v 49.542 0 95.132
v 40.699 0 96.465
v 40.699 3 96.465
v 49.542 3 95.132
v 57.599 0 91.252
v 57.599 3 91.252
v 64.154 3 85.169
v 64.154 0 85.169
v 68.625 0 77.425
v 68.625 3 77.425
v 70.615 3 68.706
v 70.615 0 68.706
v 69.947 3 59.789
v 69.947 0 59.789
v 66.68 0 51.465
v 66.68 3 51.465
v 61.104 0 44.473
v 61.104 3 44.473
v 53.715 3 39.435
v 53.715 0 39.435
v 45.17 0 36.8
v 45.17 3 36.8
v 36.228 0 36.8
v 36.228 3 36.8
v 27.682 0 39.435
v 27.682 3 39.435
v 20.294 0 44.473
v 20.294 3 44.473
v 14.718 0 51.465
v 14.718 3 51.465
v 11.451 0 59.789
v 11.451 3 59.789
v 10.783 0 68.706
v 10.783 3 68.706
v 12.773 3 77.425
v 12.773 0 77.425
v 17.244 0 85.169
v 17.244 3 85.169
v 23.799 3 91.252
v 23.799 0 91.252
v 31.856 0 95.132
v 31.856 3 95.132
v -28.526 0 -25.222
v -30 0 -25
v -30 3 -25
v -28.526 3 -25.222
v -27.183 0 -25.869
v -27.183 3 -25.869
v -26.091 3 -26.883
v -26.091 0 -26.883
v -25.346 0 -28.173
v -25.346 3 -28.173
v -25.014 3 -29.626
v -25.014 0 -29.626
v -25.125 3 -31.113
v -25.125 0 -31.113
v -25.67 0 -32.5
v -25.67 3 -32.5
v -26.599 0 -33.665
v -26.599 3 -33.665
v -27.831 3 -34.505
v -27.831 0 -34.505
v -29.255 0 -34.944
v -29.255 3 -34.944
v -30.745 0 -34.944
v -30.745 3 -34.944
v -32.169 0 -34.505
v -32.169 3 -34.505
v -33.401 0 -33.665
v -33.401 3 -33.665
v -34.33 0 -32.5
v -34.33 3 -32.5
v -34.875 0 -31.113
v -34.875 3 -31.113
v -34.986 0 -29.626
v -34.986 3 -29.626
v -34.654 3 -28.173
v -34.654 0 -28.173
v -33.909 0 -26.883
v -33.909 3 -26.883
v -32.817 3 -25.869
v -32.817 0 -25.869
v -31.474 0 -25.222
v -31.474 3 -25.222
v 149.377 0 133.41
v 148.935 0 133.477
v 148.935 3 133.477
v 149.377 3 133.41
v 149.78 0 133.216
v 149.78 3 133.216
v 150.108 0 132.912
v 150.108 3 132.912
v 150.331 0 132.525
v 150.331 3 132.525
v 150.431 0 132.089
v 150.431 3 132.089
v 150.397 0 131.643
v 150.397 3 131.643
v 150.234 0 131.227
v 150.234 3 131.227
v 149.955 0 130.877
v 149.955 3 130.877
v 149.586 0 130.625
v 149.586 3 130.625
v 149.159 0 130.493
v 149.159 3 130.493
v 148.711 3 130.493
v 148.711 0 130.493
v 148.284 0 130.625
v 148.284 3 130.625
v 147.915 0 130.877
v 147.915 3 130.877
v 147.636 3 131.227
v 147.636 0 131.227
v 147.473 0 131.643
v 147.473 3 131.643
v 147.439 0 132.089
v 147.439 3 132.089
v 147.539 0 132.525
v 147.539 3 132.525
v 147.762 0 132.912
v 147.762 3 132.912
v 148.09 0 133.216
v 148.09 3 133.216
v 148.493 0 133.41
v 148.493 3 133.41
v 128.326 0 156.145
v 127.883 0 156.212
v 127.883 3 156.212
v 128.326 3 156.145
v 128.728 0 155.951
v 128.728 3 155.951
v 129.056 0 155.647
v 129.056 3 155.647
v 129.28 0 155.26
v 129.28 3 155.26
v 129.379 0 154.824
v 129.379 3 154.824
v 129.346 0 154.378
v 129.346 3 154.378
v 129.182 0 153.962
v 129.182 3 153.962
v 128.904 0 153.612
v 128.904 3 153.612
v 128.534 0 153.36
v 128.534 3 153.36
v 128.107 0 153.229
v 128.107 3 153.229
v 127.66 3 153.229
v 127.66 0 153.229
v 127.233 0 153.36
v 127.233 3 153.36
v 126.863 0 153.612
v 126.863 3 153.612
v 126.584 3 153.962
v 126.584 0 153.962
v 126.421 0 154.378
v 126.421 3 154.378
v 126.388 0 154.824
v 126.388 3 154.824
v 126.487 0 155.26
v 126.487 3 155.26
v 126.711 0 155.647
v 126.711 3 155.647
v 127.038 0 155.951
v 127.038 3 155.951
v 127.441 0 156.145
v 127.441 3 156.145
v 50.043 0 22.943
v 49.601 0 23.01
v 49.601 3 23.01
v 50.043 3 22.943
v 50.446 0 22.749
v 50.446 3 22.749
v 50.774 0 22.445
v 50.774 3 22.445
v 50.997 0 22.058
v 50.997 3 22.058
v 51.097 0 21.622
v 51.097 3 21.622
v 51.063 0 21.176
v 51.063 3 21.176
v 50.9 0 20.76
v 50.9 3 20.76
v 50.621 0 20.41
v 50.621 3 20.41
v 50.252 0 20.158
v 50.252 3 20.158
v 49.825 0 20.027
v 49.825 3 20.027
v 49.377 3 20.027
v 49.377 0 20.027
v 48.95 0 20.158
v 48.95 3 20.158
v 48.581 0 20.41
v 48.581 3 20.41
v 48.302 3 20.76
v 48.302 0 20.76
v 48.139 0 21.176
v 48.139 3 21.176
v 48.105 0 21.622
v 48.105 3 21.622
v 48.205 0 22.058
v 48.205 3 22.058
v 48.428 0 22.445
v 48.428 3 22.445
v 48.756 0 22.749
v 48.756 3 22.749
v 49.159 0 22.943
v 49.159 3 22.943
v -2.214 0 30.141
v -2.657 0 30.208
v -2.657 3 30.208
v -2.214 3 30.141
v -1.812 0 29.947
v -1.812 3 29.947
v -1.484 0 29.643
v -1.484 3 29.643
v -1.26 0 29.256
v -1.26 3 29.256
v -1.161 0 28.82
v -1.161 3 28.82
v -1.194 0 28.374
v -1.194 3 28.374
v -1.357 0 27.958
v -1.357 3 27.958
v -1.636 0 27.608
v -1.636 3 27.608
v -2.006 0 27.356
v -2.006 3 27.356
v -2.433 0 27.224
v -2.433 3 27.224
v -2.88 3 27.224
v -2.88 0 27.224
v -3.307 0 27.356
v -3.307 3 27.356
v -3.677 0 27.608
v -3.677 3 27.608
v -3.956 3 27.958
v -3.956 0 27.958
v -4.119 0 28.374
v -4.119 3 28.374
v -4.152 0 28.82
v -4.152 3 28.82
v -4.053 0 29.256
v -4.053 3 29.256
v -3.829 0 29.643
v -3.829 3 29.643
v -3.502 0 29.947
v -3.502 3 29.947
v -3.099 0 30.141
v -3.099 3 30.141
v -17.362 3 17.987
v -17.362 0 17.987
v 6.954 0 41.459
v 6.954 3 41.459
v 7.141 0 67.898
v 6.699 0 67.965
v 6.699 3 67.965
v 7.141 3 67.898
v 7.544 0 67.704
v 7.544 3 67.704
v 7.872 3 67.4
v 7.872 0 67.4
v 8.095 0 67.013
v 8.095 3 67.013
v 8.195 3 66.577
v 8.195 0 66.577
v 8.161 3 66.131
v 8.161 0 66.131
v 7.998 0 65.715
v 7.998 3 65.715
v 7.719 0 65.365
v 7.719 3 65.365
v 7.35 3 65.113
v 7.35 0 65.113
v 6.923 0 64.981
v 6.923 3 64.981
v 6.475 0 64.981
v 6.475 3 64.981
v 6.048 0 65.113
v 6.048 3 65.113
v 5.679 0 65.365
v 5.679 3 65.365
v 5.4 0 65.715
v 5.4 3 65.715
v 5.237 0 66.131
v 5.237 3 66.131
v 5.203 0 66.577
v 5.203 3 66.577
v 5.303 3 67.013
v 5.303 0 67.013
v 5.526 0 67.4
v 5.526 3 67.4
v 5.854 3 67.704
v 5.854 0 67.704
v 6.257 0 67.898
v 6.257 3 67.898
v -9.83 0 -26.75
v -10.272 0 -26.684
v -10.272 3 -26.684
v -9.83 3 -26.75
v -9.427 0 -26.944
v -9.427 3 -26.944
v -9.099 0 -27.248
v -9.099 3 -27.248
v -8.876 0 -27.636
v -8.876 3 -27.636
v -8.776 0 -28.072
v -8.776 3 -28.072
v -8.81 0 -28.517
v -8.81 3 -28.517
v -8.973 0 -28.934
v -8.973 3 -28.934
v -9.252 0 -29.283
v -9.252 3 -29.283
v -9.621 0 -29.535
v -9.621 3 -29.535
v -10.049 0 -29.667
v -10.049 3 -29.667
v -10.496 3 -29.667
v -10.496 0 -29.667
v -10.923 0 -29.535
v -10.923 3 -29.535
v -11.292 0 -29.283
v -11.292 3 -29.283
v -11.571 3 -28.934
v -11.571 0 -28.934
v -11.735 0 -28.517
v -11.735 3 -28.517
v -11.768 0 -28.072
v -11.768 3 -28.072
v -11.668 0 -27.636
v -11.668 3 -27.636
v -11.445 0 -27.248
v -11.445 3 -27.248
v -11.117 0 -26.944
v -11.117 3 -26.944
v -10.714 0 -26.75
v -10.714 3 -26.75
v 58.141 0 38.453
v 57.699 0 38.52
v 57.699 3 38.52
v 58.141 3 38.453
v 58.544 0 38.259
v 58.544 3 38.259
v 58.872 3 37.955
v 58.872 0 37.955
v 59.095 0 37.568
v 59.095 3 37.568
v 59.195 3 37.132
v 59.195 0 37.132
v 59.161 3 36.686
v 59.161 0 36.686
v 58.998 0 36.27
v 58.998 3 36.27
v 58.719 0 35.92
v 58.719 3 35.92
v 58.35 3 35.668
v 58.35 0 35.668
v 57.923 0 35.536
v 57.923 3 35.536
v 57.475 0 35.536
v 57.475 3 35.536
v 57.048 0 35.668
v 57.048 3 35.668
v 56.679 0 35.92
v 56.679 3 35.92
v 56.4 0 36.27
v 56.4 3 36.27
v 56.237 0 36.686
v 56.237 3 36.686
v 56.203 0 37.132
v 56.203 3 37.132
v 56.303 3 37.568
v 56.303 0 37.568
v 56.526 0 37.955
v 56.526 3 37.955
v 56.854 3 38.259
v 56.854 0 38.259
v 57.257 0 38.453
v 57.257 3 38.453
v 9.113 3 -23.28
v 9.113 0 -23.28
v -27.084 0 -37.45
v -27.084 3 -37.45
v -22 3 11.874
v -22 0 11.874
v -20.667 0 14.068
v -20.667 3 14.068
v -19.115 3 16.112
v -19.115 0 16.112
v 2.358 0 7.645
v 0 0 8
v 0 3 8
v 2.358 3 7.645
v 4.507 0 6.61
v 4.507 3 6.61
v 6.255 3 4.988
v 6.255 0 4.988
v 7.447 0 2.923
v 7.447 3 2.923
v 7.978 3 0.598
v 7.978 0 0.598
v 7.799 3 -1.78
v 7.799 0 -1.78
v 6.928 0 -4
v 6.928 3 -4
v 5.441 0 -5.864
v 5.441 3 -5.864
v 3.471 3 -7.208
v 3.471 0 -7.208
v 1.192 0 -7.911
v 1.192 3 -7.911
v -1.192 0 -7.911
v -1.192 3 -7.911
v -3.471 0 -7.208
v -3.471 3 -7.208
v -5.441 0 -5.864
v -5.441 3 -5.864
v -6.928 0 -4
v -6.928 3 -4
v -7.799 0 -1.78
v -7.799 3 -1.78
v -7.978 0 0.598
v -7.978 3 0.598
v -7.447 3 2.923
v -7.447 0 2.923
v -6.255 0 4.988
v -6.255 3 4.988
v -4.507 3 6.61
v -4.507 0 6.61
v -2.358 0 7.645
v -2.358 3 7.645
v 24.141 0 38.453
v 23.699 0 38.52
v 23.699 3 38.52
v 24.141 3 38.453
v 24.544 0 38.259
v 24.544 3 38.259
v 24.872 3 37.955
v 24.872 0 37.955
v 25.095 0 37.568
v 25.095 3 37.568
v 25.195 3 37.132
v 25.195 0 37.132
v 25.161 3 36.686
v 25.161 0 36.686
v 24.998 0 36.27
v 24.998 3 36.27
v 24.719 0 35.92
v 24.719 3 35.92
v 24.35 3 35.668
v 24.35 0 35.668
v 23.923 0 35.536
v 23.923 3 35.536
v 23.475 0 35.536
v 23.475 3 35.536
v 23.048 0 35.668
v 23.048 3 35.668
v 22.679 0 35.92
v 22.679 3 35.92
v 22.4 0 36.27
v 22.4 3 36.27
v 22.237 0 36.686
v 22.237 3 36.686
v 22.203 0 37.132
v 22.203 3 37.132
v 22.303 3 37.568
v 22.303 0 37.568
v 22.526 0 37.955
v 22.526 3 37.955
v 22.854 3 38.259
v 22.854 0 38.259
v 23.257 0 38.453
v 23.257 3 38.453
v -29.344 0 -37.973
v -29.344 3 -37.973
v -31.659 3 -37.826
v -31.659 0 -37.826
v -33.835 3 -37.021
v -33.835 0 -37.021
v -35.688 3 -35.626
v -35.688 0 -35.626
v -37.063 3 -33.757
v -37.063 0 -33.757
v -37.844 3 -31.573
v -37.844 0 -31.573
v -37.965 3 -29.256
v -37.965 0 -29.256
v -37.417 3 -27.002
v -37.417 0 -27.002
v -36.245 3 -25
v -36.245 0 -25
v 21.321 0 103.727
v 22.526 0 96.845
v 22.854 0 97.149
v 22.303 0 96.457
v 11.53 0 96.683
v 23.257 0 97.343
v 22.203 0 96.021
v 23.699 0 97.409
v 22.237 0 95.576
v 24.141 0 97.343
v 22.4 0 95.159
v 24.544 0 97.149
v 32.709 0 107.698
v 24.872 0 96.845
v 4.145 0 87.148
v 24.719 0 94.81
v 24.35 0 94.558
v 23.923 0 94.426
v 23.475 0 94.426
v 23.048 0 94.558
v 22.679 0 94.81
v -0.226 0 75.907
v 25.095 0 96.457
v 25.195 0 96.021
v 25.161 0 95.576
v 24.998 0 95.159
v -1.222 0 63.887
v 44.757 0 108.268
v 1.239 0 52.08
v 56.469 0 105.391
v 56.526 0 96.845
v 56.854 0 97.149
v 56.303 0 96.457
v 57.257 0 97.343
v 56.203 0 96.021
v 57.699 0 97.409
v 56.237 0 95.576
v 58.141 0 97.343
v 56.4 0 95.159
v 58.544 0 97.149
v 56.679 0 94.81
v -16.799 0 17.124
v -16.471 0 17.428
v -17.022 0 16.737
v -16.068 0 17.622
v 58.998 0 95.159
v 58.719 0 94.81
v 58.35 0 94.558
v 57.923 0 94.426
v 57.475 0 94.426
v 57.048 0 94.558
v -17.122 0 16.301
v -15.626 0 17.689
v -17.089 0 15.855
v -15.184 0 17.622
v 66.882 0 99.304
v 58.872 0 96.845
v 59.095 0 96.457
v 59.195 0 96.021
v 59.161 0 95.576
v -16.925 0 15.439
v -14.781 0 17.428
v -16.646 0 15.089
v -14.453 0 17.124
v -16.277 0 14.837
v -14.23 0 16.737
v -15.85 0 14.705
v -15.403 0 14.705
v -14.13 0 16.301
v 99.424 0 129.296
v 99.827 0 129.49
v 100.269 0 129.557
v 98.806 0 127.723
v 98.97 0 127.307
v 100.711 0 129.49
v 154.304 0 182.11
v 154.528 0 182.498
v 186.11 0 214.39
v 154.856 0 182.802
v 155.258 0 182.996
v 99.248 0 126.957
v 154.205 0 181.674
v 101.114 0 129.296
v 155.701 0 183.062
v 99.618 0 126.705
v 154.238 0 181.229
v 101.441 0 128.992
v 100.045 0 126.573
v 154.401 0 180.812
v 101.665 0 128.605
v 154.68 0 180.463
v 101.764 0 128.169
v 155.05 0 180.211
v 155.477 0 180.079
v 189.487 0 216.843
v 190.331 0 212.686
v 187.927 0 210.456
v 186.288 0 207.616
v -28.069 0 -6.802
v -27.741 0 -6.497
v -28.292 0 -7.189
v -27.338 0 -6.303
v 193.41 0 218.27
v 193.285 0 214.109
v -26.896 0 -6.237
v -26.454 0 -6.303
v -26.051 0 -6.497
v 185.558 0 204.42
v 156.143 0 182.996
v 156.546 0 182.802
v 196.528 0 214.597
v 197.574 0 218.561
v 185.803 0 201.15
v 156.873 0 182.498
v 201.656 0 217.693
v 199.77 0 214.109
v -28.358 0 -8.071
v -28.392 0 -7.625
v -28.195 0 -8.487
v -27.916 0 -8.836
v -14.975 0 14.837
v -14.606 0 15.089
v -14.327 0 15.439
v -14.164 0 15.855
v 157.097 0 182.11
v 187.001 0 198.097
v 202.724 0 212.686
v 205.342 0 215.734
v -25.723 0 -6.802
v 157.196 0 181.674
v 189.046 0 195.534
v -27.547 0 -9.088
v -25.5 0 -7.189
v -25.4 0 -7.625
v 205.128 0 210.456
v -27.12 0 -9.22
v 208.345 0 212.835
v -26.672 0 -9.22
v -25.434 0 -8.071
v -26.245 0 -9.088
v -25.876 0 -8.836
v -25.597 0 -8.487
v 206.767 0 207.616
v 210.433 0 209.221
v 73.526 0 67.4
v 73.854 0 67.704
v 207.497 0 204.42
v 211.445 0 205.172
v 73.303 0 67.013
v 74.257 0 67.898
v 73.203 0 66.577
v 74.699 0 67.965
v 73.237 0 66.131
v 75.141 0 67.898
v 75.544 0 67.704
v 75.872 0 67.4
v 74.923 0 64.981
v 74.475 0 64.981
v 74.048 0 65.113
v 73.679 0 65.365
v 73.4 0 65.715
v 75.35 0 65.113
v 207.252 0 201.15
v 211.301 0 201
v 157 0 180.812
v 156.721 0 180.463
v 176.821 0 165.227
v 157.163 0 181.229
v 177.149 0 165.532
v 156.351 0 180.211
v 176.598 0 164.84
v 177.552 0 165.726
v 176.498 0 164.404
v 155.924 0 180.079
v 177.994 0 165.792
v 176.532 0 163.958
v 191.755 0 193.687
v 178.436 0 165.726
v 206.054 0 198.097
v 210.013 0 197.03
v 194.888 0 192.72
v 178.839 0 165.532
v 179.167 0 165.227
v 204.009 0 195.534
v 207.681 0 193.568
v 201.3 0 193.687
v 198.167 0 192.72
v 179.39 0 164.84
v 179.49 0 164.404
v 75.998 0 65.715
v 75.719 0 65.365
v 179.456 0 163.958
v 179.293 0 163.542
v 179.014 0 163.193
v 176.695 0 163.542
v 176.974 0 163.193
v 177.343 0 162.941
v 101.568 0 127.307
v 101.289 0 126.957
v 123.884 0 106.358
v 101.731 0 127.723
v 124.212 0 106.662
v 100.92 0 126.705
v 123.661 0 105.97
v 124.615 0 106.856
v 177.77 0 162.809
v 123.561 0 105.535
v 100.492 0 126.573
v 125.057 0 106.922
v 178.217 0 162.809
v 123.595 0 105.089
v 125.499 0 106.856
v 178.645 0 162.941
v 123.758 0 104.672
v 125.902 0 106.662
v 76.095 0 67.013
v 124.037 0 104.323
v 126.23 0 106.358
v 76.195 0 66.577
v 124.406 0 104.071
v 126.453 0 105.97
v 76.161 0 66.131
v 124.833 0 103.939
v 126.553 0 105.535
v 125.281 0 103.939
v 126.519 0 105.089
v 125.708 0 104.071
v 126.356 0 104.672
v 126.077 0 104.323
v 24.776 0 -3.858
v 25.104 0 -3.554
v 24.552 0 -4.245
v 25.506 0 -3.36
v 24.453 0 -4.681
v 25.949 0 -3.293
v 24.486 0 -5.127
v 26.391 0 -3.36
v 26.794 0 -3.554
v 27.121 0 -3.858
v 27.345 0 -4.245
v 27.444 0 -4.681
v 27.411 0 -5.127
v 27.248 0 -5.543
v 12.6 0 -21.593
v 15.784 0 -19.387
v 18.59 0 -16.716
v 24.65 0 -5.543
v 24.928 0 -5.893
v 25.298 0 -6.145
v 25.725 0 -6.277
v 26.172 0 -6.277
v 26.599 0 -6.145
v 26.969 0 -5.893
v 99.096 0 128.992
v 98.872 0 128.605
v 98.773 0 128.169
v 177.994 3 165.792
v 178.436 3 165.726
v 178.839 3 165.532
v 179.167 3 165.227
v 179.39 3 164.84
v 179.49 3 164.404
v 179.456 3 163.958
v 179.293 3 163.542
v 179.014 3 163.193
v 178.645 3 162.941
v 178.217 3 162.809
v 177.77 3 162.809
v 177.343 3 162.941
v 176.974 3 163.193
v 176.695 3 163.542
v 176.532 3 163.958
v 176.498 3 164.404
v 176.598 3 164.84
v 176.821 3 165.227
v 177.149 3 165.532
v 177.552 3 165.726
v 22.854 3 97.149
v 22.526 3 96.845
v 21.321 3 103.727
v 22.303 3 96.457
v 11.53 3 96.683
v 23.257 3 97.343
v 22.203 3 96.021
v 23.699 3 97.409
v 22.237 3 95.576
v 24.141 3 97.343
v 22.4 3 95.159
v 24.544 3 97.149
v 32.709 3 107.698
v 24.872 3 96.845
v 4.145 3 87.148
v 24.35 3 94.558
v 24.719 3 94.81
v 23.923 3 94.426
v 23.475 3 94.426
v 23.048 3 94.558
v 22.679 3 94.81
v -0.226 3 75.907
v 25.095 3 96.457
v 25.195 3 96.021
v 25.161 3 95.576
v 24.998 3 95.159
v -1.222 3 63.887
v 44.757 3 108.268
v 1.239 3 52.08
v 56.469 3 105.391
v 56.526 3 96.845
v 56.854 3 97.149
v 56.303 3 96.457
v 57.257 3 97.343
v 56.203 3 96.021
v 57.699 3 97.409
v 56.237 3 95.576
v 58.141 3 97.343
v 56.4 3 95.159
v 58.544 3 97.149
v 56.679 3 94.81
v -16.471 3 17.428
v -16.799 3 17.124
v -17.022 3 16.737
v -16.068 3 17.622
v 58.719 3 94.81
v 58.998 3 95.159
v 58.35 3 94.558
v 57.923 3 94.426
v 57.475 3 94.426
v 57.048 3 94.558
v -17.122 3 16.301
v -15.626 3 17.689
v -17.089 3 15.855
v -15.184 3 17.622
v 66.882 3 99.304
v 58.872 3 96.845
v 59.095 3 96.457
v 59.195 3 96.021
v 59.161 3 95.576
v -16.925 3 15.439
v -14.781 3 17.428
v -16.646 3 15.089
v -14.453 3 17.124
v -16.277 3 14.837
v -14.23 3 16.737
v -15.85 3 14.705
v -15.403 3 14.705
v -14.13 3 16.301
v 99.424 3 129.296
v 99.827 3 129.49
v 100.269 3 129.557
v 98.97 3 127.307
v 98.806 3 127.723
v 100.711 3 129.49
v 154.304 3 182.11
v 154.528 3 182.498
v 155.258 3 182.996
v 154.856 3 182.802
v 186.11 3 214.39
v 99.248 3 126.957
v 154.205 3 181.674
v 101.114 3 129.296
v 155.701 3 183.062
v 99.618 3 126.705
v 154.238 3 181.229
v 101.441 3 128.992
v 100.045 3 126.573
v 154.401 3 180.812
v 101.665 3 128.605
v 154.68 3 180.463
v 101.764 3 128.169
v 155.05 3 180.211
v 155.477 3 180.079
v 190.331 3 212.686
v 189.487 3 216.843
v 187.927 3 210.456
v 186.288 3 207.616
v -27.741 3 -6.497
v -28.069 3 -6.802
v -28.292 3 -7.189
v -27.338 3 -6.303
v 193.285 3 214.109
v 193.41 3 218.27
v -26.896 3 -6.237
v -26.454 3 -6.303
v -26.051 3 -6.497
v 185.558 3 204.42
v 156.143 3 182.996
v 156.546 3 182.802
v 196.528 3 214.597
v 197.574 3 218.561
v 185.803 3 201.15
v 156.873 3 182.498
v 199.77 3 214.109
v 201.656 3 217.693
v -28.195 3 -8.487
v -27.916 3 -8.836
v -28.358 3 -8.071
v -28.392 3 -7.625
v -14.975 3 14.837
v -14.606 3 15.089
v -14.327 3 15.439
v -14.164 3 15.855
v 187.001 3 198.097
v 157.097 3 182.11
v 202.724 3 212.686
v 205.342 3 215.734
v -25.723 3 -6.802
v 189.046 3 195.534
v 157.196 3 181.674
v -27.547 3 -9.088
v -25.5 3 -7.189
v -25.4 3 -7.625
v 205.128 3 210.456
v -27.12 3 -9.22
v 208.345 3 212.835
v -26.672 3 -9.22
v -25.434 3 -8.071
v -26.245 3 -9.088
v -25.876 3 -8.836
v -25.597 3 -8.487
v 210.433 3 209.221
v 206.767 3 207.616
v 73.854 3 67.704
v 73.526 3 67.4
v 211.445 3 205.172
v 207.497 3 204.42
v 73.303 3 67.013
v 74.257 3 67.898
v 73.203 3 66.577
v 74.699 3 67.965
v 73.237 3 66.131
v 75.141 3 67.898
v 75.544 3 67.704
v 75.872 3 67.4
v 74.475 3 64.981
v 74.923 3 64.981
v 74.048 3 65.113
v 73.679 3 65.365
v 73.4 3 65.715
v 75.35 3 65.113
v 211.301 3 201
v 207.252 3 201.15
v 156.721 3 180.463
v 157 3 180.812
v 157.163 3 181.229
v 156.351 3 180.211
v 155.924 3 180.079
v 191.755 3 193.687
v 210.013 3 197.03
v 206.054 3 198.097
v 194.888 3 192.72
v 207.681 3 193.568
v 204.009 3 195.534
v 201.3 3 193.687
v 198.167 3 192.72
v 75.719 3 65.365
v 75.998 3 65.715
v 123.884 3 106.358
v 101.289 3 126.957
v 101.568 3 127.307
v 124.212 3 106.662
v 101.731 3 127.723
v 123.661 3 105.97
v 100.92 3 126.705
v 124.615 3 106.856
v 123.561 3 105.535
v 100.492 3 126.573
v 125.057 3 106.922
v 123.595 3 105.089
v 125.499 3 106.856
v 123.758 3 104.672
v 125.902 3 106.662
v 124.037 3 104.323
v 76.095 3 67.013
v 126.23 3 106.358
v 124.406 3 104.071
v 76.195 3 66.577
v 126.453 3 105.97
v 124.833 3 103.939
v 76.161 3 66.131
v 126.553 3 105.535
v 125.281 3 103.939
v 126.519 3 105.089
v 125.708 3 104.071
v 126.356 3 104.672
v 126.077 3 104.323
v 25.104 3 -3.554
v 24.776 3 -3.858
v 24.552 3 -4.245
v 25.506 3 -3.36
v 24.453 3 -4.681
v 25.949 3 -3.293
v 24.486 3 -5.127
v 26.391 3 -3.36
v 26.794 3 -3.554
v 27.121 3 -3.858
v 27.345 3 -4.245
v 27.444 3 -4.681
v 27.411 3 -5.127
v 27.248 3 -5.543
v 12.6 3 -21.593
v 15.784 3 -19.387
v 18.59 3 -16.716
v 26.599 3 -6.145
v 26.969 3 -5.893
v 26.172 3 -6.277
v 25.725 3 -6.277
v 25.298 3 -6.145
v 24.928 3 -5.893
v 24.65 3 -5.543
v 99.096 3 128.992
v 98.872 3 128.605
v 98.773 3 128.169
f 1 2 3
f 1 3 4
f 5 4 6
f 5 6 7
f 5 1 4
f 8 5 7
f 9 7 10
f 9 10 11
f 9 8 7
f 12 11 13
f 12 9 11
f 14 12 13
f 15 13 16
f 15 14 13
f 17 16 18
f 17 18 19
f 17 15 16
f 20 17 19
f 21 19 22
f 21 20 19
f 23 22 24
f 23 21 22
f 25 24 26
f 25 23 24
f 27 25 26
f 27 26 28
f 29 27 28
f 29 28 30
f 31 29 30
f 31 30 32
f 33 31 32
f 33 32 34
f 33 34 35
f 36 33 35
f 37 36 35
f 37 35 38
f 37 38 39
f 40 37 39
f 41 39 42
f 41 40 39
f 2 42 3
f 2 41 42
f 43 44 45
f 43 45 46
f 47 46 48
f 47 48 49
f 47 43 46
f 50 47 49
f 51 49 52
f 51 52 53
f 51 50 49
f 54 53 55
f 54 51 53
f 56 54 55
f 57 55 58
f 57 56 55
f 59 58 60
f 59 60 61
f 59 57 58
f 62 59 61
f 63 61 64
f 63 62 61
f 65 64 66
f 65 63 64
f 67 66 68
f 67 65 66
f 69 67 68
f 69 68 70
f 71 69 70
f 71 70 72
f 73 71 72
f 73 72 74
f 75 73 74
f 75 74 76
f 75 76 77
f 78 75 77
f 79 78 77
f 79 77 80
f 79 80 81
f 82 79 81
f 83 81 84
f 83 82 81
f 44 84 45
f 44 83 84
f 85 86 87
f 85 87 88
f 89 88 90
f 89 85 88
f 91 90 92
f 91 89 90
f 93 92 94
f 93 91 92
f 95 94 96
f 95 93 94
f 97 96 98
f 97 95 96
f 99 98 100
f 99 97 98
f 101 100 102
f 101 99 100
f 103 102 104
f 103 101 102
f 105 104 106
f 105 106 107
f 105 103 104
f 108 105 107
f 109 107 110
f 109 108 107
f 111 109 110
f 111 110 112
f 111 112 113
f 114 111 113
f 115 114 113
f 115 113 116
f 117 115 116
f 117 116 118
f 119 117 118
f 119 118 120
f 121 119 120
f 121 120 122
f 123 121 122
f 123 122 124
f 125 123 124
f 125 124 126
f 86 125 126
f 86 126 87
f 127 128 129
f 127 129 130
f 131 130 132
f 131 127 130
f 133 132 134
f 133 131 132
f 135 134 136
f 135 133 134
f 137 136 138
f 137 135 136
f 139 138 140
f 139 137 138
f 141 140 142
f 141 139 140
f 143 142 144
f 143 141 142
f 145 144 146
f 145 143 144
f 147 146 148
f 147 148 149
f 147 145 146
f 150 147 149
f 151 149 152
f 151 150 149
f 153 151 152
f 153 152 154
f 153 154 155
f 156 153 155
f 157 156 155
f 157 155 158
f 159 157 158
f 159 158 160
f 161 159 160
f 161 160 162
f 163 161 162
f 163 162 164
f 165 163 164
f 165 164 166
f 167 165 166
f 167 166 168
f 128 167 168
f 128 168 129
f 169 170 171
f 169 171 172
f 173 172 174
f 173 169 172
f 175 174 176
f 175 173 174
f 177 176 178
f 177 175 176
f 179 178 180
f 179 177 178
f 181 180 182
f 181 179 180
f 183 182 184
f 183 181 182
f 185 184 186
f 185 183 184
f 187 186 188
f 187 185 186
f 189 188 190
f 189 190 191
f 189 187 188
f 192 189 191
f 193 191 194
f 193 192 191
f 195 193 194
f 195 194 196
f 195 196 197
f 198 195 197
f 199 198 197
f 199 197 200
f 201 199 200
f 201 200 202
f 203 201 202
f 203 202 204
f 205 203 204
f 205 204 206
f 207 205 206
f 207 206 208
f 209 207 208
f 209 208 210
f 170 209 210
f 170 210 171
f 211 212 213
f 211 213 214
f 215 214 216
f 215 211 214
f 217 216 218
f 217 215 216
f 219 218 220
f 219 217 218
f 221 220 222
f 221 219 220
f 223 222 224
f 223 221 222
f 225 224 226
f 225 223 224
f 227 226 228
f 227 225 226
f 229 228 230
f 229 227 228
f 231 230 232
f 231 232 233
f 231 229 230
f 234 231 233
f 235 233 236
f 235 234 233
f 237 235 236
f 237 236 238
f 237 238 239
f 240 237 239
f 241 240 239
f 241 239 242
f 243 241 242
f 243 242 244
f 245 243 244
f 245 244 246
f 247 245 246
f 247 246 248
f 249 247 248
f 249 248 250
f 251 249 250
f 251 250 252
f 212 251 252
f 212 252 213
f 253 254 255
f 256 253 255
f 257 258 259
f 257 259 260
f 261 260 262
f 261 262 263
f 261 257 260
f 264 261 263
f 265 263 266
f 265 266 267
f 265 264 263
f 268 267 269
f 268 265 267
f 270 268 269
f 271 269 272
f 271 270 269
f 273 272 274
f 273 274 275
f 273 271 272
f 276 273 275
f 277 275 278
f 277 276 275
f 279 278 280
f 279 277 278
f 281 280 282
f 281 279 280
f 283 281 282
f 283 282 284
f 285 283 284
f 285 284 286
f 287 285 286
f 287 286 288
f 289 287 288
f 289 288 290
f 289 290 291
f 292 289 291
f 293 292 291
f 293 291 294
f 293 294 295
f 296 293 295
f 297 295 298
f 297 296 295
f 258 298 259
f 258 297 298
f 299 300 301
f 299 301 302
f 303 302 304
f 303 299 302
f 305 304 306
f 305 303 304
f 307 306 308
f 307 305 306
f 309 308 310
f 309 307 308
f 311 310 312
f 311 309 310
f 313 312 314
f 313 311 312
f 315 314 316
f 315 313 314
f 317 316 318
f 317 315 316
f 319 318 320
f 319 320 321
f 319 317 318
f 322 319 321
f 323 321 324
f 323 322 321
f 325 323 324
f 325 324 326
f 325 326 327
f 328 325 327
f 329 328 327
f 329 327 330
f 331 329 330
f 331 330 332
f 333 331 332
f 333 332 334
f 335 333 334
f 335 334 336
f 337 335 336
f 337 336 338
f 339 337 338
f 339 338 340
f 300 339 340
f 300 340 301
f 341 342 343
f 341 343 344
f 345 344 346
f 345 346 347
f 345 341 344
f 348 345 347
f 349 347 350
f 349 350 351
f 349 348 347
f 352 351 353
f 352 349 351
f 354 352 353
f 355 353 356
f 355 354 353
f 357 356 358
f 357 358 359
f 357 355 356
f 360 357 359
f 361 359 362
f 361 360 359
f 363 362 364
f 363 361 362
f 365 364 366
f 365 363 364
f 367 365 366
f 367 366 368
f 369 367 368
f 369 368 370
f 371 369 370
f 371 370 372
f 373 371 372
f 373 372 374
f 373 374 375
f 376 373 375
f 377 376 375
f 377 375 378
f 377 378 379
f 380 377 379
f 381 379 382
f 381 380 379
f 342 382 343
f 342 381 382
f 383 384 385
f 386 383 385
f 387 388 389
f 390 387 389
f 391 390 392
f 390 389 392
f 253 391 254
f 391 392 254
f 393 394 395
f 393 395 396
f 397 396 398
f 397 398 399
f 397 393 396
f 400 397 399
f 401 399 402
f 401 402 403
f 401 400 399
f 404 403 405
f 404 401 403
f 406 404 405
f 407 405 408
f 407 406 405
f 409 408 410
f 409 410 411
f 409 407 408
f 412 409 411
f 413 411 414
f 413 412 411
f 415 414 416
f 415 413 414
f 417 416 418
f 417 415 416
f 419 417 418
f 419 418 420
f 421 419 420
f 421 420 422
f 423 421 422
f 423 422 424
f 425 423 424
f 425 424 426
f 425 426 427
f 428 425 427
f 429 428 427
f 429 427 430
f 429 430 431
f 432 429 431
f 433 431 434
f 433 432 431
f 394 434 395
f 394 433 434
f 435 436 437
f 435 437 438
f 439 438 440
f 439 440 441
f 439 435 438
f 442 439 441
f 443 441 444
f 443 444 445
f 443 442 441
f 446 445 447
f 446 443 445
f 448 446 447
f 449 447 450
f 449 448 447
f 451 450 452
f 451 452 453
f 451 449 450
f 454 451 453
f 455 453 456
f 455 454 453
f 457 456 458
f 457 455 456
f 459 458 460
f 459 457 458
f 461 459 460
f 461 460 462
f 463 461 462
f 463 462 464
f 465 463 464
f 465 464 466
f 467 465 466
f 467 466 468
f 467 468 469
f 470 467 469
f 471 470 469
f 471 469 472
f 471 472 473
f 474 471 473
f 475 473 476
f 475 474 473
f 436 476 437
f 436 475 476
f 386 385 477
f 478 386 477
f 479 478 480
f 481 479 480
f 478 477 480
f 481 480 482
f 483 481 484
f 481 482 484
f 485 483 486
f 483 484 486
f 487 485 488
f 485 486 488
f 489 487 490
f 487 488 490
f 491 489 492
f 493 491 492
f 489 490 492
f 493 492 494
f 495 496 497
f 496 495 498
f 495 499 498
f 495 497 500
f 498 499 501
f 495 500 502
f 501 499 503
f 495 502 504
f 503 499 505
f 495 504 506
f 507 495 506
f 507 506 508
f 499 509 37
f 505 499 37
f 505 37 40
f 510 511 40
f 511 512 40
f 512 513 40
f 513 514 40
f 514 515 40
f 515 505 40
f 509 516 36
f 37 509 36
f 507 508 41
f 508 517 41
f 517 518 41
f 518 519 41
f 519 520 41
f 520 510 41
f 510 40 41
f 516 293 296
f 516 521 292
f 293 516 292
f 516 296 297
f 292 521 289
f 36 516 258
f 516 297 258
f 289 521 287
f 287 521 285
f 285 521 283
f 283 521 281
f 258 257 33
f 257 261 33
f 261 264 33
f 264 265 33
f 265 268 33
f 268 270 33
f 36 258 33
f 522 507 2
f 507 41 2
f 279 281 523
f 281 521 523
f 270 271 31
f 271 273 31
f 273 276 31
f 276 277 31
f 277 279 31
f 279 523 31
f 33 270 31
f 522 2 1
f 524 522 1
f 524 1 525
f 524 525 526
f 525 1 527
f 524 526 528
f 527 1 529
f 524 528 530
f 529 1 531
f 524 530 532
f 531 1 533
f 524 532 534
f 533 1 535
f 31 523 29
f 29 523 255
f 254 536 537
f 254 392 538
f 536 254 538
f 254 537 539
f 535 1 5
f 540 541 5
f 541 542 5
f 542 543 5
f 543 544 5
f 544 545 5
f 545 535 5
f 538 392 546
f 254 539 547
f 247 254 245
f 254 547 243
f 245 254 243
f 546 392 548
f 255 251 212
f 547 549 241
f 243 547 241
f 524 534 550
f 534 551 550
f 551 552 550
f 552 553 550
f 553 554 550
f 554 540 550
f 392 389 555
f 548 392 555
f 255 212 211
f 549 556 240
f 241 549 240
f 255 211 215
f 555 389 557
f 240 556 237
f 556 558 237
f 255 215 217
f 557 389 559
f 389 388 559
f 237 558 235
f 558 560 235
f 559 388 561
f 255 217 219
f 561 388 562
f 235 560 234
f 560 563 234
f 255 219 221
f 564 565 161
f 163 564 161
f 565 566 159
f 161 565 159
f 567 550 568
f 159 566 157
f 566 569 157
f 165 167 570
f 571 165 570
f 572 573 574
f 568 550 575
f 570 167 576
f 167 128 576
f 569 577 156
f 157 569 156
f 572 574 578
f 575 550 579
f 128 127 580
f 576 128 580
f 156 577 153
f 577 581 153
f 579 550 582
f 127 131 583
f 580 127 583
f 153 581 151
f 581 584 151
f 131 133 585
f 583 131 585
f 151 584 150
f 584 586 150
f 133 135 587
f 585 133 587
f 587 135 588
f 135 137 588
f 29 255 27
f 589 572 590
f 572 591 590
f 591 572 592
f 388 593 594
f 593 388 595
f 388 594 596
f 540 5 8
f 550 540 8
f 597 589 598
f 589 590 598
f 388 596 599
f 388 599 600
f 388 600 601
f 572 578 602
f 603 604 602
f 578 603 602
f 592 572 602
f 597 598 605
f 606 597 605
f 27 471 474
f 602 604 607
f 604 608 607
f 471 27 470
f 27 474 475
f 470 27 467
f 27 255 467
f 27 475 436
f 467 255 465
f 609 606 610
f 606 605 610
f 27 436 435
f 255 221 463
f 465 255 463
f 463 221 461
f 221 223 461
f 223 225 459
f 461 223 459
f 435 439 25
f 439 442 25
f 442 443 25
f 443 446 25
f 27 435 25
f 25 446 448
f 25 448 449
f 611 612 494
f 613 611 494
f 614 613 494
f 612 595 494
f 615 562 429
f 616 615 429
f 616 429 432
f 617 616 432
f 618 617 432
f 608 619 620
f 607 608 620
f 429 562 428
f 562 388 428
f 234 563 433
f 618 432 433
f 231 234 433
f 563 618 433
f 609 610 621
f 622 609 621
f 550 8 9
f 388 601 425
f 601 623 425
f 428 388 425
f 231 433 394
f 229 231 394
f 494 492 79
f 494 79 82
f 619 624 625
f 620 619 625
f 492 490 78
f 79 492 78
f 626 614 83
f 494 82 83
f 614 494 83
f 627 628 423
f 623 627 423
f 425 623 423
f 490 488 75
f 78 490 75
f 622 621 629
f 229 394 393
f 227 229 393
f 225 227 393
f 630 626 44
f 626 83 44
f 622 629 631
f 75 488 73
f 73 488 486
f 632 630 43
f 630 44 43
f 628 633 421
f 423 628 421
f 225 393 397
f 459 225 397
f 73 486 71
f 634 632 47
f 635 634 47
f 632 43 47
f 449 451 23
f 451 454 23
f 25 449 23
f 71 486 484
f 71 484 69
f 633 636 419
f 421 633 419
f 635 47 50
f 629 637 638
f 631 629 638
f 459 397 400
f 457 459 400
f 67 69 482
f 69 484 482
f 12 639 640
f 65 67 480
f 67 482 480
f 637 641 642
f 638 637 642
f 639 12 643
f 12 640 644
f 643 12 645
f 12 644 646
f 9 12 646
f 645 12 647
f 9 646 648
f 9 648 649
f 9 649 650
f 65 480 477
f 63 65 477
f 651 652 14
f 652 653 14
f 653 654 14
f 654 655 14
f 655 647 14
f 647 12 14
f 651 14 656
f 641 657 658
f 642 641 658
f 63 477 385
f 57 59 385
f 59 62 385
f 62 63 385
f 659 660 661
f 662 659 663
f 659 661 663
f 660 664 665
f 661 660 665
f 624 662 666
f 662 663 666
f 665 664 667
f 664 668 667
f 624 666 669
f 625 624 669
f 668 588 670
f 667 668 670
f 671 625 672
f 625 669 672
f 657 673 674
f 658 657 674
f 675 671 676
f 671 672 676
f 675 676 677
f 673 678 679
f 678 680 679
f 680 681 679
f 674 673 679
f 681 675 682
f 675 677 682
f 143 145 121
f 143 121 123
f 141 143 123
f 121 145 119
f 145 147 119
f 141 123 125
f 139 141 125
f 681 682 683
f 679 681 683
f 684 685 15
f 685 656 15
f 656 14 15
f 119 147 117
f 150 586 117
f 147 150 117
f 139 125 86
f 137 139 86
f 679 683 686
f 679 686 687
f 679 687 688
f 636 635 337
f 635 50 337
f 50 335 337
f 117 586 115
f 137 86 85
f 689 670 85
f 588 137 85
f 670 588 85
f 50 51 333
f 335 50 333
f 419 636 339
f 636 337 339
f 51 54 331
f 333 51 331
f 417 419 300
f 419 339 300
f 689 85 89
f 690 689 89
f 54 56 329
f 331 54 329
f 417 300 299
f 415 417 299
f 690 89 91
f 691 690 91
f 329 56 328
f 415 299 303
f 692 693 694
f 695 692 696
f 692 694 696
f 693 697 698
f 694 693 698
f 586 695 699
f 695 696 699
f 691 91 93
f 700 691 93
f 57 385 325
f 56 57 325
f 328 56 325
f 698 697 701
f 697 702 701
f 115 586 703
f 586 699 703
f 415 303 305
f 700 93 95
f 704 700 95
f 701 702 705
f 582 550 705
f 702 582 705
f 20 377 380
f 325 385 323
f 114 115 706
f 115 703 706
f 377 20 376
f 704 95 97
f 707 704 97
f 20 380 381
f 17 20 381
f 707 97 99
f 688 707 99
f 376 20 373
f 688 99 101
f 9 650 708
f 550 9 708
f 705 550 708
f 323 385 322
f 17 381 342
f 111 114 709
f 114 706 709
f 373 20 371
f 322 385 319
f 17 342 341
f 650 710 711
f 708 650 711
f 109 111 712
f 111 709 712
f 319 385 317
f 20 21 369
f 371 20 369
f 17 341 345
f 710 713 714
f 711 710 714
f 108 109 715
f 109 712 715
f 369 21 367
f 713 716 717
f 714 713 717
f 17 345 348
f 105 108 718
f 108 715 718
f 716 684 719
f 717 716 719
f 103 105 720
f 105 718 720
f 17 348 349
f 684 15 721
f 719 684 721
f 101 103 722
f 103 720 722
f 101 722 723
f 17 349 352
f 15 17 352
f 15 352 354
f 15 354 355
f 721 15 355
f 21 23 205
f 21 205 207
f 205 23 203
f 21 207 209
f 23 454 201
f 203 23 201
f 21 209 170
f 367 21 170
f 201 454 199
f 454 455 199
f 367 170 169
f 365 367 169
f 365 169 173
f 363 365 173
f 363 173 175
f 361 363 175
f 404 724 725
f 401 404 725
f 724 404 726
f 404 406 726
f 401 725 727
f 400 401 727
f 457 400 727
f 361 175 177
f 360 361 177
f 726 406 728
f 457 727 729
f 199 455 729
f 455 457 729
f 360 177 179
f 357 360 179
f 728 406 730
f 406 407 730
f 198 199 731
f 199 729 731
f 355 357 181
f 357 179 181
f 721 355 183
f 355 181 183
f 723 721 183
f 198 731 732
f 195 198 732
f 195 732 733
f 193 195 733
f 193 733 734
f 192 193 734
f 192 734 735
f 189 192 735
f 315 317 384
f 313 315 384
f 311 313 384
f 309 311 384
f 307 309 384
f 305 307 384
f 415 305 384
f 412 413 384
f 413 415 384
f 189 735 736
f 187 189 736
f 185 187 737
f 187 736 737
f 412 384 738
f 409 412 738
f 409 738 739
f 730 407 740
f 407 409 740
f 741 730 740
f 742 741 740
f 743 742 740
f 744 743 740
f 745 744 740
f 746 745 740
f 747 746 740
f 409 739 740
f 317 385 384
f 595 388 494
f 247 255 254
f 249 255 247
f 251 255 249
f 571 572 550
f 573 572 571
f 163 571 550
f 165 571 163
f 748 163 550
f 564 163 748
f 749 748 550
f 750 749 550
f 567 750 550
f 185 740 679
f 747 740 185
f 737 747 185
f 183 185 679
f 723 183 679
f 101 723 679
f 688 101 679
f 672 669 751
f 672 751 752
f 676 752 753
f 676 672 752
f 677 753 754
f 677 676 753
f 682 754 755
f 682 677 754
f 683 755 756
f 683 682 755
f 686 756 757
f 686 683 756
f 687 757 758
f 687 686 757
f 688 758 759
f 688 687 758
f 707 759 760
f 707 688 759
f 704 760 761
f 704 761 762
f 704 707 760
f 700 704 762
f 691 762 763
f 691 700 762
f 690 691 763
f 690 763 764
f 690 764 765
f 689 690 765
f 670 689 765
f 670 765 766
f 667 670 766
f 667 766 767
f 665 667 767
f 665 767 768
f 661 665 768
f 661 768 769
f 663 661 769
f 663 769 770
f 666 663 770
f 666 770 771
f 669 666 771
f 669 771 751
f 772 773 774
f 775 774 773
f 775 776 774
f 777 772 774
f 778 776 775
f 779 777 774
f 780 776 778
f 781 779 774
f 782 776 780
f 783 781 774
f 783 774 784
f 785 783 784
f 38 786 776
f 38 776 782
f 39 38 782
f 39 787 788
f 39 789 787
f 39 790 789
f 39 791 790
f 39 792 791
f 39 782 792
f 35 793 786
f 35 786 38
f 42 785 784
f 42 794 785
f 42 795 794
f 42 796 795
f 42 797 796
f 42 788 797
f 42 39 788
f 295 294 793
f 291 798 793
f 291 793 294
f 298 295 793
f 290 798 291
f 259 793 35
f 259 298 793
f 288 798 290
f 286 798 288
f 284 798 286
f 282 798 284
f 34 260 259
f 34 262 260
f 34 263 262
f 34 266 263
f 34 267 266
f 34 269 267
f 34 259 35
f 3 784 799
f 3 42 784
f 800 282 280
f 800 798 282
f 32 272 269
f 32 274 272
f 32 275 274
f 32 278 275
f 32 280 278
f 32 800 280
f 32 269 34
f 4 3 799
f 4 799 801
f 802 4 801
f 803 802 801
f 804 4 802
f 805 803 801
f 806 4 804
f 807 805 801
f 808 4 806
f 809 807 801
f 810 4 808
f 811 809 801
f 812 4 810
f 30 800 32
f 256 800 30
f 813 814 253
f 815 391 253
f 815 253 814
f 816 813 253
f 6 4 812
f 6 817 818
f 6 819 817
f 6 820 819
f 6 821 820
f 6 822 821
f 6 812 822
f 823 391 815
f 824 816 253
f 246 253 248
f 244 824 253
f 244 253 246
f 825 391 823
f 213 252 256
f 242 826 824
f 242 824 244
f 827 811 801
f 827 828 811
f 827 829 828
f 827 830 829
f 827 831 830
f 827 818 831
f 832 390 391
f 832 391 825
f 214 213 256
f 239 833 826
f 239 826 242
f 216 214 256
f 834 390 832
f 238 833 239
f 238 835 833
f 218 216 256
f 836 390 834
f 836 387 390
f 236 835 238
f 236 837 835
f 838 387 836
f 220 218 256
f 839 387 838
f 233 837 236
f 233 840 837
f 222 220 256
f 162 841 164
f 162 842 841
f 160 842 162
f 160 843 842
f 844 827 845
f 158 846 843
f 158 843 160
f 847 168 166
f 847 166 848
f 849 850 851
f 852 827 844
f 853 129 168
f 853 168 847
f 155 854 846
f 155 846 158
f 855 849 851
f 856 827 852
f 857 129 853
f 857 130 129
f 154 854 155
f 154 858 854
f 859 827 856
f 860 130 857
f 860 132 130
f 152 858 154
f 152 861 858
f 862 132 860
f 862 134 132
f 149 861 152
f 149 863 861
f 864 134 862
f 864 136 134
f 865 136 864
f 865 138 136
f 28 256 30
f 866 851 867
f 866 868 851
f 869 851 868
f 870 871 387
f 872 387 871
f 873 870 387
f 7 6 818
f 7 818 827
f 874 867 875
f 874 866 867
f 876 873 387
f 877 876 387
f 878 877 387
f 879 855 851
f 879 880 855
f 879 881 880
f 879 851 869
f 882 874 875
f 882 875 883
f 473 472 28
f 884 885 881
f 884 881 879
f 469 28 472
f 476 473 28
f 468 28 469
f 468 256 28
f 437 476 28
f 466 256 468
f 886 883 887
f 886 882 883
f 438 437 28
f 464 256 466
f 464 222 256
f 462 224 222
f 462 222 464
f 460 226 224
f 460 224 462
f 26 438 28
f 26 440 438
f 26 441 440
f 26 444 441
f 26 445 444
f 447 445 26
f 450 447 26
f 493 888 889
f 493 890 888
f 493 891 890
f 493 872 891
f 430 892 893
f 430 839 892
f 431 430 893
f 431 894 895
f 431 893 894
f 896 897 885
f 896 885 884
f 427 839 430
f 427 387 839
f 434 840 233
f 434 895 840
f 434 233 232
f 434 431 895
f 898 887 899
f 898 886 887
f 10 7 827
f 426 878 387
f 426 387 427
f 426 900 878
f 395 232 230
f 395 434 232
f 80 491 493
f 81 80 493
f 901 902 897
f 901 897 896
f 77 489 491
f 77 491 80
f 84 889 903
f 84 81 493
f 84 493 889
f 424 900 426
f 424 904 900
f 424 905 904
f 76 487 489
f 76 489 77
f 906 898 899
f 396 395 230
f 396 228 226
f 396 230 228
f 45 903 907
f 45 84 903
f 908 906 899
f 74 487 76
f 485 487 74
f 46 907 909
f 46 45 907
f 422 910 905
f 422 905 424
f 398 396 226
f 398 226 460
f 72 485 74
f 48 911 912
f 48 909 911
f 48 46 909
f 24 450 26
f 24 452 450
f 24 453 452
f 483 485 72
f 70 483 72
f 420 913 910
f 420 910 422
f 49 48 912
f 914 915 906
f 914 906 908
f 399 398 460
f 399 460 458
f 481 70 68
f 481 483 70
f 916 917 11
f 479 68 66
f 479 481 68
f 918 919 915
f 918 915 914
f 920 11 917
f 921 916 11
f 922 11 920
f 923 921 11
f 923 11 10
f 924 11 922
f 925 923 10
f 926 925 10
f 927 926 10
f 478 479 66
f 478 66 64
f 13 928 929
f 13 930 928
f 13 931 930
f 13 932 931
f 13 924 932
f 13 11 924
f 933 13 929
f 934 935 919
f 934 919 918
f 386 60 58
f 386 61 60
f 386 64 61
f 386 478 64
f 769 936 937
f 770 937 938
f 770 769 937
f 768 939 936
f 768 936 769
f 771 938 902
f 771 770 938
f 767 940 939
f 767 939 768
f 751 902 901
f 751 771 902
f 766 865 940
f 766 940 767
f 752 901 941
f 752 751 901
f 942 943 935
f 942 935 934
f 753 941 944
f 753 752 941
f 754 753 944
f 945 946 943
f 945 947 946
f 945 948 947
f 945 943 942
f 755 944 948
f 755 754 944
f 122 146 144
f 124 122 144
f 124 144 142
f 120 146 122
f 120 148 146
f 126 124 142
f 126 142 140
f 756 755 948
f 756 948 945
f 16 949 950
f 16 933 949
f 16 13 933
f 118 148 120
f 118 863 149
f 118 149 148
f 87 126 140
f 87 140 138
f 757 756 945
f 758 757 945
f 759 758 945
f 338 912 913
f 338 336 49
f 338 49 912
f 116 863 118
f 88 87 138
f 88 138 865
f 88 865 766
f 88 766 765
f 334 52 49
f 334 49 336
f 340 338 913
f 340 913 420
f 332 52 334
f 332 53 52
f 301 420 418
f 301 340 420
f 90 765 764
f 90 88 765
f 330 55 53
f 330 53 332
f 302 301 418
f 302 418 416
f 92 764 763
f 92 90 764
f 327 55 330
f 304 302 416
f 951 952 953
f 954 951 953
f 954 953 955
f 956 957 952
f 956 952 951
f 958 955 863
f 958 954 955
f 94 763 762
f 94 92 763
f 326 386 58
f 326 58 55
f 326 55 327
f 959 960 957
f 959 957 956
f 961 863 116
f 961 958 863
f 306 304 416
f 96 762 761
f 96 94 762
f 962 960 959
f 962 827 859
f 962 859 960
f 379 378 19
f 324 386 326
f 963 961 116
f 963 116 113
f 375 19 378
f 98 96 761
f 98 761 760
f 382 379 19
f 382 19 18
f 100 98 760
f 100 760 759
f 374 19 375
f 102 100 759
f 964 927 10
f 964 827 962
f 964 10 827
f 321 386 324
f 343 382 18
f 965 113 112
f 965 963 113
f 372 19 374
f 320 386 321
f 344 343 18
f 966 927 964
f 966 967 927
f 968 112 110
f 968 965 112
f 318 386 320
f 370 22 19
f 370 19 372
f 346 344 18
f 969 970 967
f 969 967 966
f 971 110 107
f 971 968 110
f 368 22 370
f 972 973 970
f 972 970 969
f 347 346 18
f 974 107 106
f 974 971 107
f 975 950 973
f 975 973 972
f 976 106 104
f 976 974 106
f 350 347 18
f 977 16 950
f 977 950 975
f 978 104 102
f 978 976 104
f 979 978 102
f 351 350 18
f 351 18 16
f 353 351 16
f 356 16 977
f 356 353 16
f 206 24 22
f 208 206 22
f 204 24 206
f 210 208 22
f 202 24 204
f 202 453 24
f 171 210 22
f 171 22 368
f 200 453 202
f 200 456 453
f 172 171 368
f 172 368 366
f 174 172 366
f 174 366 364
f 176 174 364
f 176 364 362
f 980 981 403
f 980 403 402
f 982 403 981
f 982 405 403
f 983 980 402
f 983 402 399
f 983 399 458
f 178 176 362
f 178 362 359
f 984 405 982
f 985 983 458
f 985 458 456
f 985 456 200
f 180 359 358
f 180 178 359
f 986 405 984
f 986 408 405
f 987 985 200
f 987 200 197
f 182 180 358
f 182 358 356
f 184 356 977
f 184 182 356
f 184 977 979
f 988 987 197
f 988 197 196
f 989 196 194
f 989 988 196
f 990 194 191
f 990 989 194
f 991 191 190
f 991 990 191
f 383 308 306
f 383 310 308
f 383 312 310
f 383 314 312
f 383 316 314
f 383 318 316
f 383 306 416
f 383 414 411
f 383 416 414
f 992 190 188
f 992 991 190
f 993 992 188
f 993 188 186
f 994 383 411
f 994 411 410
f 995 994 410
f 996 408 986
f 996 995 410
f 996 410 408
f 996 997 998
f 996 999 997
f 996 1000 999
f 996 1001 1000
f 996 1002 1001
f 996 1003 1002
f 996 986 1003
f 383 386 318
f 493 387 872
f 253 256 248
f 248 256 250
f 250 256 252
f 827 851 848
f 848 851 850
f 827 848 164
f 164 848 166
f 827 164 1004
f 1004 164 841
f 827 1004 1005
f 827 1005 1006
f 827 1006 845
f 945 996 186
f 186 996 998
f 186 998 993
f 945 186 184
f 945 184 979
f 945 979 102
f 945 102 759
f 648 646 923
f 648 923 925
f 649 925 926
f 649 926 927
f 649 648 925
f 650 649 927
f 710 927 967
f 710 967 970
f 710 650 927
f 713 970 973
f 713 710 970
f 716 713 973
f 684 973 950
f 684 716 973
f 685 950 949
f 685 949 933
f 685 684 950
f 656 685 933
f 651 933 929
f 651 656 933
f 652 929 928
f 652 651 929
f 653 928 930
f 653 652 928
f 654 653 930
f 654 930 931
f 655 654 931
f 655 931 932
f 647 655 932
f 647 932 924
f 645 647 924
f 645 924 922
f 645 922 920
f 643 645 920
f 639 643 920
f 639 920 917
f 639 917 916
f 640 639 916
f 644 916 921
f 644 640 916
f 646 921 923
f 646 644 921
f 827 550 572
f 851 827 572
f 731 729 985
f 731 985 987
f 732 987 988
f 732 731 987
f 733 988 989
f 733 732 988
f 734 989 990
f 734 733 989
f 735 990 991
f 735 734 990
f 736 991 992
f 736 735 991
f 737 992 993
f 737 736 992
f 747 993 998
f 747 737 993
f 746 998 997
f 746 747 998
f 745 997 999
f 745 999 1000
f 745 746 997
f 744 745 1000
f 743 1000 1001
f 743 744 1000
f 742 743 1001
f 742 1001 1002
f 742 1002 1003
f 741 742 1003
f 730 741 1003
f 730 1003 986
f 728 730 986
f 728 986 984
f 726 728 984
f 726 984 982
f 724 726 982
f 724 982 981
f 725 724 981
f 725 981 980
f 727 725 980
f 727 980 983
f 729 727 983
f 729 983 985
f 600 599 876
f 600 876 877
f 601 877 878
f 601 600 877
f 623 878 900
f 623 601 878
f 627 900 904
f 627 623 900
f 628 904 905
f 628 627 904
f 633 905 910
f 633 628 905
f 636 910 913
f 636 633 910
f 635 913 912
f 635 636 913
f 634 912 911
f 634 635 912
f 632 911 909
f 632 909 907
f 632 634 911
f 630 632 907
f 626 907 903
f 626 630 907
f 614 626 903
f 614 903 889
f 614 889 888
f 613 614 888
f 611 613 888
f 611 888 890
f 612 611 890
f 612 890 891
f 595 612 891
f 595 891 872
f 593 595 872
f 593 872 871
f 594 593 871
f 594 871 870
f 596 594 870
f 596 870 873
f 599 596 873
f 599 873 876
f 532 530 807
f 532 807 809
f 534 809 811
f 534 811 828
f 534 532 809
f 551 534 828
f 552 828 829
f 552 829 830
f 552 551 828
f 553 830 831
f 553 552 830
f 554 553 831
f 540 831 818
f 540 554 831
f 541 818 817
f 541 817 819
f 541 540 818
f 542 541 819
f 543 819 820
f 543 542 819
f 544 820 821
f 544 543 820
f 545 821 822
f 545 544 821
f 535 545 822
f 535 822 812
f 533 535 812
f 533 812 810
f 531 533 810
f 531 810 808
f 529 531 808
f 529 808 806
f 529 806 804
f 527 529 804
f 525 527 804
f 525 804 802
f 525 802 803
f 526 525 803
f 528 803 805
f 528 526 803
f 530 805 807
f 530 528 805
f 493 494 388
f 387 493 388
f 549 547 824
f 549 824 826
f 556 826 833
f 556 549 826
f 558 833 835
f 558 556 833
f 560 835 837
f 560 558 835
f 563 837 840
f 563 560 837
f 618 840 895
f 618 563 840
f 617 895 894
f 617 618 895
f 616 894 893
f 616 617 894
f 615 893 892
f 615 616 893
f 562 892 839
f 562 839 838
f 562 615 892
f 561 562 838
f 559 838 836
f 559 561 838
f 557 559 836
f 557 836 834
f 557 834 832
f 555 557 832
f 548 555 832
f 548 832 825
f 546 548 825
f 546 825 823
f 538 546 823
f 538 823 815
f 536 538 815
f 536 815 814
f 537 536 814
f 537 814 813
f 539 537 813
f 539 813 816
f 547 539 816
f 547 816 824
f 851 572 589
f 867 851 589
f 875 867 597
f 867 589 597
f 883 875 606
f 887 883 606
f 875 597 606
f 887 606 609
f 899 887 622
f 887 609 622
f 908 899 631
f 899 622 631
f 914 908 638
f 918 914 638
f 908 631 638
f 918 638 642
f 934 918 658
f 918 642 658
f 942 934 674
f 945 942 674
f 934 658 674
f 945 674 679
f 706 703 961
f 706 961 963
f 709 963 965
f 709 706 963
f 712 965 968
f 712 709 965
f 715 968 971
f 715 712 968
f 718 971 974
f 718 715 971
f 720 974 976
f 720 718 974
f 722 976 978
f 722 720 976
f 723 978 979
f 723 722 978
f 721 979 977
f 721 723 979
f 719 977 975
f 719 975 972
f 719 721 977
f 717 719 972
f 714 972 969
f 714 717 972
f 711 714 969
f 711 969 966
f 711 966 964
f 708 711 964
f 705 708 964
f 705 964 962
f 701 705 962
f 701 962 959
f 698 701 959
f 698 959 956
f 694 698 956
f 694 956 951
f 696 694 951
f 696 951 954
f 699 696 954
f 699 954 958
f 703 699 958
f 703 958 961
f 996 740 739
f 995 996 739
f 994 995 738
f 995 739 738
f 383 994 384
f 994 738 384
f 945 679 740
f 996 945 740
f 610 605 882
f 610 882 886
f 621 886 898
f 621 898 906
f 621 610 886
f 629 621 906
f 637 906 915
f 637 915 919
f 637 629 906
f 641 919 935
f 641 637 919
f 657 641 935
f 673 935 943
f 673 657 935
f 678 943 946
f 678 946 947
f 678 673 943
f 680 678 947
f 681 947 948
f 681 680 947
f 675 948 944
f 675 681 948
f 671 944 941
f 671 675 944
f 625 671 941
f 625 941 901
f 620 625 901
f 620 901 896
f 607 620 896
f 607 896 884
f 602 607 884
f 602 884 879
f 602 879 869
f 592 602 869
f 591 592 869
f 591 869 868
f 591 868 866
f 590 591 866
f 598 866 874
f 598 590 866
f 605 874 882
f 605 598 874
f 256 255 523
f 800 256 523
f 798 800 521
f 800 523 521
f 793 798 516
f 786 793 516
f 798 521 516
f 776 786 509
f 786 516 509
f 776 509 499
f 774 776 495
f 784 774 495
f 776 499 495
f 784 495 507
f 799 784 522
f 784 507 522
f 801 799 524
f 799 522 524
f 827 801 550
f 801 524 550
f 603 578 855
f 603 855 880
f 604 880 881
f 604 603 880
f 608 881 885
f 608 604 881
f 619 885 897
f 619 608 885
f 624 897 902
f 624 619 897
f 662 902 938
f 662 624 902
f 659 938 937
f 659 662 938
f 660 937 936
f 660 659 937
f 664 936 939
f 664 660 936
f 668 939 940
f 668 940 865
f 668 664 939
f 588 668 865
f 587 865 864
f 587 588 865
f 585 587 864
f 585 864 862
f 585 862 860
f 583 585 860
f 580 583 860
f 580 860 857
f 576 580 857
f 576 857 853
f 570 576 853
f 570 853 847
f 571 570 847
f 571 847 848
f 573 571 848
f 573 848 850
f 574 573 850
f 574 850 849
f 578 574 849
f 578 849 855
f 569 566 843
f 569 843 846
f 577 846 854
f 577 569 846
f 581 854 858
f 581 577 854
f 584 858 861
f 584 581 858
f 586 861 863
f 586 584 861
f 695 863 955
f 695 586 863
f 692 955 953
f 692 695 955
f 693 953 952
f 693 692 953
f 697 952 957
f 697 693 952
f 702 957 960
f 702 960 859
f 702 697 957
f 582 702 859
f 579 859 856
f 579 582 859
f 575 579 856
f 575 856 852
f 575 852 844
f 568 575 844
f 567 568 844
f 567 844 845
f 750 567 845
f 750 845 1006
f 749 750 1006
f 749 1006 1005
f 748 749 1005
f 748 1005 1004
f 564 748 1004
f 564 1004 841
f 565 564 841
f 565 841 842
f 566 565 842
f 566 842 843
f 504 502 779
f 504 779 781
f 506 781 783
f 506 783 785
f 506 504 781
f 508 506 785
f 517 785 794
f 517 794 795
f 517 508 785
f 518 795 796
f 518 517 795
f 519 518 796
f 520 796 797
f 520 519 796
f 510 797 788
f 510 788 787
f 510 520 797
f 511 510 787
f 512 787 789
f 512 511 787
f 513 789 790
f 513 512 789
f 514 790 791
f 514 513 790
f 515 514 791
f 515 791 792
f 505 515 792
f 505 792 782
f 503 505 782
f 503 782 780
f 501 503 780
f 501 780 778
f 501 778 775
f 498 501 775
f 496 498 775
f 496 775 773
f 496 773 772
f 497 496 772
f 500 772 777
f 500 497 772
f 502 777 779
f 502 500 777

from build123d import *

# Parameters (mm, degrees)
SKETCH1_R           = 30
SKETCH1_R_2         = 5
SKETCH1_R_3         = 8
SKETCH1_R_4         = 1.5
SKETCH1_R_5         = 11
BOSS_EXTRUDE1_DEPTH = 3
CUT_EXTRUDE1_START  = -10
SKETCH2_R           = 8
SKETCH2_R_2         = 1.5
CUT_EXTRUDE1_DEPTH  = 10


with BuildPart() as part:
    # Sketch1 → Boss-Extrude1 (new body)
    with BuildSketch(Plane(origin=(0, 0, 0), x_dir=(1, 0, 0), z_dir=(0, 1, 0))):
        with BuildLine():
            Line((9.113159771, 23.279826438), (-27.083788873, 37.44954446))
            ThreePointArc((-27.083788873, 37.44954446), (-36.443445881, 34.74151929), (-36.244997998, 25))
            Line((-36.244997998, 25), (-22, -11.874342087))
            ThreePointArc((-22, -11.874342087), (-19.917132472, -15.109858837), (-17.362407178, -17.987407178))
            Line((-17.362407178, -17.987407178), (6.954011254, -41.458914425))
            ThreePointArc((6.954011254, -41.458914425), (11.530098852, -96.683349609), (66.881782611, -99.30440362))
            Line((66.881782611, -99.30440362), (186.110074258, -214.389925742))
            ThreePointArc((186.110074258, -214.389925742), (206.945082055, -214.389810698), (207.681250796, -193.567812582))
            Line((207.681250796, -193.567812582), (18.589553719, 16.716114756))
            ThreePointArc((18.589553719, 16.716114756), (14.234839706, 20.551626178), (9.113159771, 23.279826438))
        make_face()
        with Locations(Location((40.698942911, -66.46450555, 0), (0, 0, 270))):
            Circle(SKETCH1_R, mode=Mode.SUBTRACT)
        with Locations(Location((-30, 30, 0), (0, 0, 270))):
            Circle(SKETCH1_R_2, mode=Mode.SUBTRACT)
        with Locations(Location((0, 0, 0), (0, 0, 270))):
            Circle(SKETCH1_R_3, mode=Mode.SUBTRACT)
        with Locations(Location((57.698942911, -37.019641821, 0), (0, 0, 270))):
            Circle(SKETCH1_R_4, mode=Mode.SUBTRACT)
        with Locations(Location((23.698942911, -37.019641821, 0), (0, 0, 270))):
            Circle(SKETCH1_R_4, mode=Mode.SUBTRACT)
        with Locations(Location((74.698942911, -66.46450555, 0), (0, 0, 270))):
            Circle(SKETCH1_R_4, mode=Mode.SUBTRACT)
        with Locations(Location((6.698942911, -66.46450555, 0), (0, 0, 270))):
            Circle(SKETCH1_R_4, mode=Mode.SUBTRACT)
        with Locations(Location((57.698942911, -95.909369279, 0), (0, 0, 270))):
            Circle(SKETCH1_R_4, mode=Mode.SUBTRACT)
        with Locations(Location((23.698942911, -95.909369279, 0), (0, 0, 270))):
            Circle(SKETCH1_R_4, mode=Mode.SUBTRACT)
        with Locations(Location((196.527518564, -203.597481436, 0), (0, 0, 270))):
            Circle(SKETCH1_R_5, mode=Mode.SUBTRACT)
    extrude(amount=BOSS_EXTRUDE1_DEPTH)

    # Sketch2 → Cut-Extrude1 (cut)
    with BuildSketch(Plane(origin=(0, 3, 0), x_dir=(1, 0, 0), z_dir=(0, 1, 0)).offset(CUT_EXTRUDE1_START)):
        with Locations(Location((0, 0, 0), (0, 0, 270))):
            Circle(SKETCH2_R)
        with Locations(Location((-15.62616646, -16.18866646, 0), (0, 0, 270))):
            Circle(SKETCH2_R_2)
        with Locations(Location((-2.656534873, -28.707648342, 0), (0, 0, 270))):
            Circle(SKETCH2_R_2)
        with Locations(Location((127.883379131, -154.711753185, 0), (0, 0, 270))):
            Circle(SKETCH2_R_2)
        with Locations(Location((100.268681967, -128.056570951, 0), (0, 0, 270))):
            Circle(SKETCH2_R_2)
        with Locations(Location((155.700523111, -181.562347912, 0), (0, 0, 270))):
            Circle(SKETCH2_R_2)
        with Locations(Location((148.934969969, -131.976518297, 0), (0, 0, 270))):
            Circle(SKETCH2_R_2)
        with Locations(Location((177.993903369, -164.292197589, 0), (0, 0, 270))):
            Circle(SKETCH2_R_2)
        with Locations(Location((125.057017775, -105.422472605, 0), (0, 0, 270))):
            Circle(SKETCH2_R_2)
        with Locations(Location((49.600984197, -21.509792527, 0), (0, 0, 270))):
            Circle(SKETCH2_R_2)
        with Locations(Location((25.948559408, 4.79345004, 0), (0, 0, 270))):
            Circle(SKETCH2_R_2)
        with Locations(Location((-26.895954044, 7.736794096, 0), (0, 0, 270))):
            Circle(SKETCH2_R_2)
        with Locations(Location((-10.272154034, 28.183705865, 0), (0, 0, 270))):
            Circle(SKETCH2_R_2)
    extrude(amount=CUT_EXTRUDE1_DEPTH, mode=Mode.SUBTRACT)


solid = part.part
